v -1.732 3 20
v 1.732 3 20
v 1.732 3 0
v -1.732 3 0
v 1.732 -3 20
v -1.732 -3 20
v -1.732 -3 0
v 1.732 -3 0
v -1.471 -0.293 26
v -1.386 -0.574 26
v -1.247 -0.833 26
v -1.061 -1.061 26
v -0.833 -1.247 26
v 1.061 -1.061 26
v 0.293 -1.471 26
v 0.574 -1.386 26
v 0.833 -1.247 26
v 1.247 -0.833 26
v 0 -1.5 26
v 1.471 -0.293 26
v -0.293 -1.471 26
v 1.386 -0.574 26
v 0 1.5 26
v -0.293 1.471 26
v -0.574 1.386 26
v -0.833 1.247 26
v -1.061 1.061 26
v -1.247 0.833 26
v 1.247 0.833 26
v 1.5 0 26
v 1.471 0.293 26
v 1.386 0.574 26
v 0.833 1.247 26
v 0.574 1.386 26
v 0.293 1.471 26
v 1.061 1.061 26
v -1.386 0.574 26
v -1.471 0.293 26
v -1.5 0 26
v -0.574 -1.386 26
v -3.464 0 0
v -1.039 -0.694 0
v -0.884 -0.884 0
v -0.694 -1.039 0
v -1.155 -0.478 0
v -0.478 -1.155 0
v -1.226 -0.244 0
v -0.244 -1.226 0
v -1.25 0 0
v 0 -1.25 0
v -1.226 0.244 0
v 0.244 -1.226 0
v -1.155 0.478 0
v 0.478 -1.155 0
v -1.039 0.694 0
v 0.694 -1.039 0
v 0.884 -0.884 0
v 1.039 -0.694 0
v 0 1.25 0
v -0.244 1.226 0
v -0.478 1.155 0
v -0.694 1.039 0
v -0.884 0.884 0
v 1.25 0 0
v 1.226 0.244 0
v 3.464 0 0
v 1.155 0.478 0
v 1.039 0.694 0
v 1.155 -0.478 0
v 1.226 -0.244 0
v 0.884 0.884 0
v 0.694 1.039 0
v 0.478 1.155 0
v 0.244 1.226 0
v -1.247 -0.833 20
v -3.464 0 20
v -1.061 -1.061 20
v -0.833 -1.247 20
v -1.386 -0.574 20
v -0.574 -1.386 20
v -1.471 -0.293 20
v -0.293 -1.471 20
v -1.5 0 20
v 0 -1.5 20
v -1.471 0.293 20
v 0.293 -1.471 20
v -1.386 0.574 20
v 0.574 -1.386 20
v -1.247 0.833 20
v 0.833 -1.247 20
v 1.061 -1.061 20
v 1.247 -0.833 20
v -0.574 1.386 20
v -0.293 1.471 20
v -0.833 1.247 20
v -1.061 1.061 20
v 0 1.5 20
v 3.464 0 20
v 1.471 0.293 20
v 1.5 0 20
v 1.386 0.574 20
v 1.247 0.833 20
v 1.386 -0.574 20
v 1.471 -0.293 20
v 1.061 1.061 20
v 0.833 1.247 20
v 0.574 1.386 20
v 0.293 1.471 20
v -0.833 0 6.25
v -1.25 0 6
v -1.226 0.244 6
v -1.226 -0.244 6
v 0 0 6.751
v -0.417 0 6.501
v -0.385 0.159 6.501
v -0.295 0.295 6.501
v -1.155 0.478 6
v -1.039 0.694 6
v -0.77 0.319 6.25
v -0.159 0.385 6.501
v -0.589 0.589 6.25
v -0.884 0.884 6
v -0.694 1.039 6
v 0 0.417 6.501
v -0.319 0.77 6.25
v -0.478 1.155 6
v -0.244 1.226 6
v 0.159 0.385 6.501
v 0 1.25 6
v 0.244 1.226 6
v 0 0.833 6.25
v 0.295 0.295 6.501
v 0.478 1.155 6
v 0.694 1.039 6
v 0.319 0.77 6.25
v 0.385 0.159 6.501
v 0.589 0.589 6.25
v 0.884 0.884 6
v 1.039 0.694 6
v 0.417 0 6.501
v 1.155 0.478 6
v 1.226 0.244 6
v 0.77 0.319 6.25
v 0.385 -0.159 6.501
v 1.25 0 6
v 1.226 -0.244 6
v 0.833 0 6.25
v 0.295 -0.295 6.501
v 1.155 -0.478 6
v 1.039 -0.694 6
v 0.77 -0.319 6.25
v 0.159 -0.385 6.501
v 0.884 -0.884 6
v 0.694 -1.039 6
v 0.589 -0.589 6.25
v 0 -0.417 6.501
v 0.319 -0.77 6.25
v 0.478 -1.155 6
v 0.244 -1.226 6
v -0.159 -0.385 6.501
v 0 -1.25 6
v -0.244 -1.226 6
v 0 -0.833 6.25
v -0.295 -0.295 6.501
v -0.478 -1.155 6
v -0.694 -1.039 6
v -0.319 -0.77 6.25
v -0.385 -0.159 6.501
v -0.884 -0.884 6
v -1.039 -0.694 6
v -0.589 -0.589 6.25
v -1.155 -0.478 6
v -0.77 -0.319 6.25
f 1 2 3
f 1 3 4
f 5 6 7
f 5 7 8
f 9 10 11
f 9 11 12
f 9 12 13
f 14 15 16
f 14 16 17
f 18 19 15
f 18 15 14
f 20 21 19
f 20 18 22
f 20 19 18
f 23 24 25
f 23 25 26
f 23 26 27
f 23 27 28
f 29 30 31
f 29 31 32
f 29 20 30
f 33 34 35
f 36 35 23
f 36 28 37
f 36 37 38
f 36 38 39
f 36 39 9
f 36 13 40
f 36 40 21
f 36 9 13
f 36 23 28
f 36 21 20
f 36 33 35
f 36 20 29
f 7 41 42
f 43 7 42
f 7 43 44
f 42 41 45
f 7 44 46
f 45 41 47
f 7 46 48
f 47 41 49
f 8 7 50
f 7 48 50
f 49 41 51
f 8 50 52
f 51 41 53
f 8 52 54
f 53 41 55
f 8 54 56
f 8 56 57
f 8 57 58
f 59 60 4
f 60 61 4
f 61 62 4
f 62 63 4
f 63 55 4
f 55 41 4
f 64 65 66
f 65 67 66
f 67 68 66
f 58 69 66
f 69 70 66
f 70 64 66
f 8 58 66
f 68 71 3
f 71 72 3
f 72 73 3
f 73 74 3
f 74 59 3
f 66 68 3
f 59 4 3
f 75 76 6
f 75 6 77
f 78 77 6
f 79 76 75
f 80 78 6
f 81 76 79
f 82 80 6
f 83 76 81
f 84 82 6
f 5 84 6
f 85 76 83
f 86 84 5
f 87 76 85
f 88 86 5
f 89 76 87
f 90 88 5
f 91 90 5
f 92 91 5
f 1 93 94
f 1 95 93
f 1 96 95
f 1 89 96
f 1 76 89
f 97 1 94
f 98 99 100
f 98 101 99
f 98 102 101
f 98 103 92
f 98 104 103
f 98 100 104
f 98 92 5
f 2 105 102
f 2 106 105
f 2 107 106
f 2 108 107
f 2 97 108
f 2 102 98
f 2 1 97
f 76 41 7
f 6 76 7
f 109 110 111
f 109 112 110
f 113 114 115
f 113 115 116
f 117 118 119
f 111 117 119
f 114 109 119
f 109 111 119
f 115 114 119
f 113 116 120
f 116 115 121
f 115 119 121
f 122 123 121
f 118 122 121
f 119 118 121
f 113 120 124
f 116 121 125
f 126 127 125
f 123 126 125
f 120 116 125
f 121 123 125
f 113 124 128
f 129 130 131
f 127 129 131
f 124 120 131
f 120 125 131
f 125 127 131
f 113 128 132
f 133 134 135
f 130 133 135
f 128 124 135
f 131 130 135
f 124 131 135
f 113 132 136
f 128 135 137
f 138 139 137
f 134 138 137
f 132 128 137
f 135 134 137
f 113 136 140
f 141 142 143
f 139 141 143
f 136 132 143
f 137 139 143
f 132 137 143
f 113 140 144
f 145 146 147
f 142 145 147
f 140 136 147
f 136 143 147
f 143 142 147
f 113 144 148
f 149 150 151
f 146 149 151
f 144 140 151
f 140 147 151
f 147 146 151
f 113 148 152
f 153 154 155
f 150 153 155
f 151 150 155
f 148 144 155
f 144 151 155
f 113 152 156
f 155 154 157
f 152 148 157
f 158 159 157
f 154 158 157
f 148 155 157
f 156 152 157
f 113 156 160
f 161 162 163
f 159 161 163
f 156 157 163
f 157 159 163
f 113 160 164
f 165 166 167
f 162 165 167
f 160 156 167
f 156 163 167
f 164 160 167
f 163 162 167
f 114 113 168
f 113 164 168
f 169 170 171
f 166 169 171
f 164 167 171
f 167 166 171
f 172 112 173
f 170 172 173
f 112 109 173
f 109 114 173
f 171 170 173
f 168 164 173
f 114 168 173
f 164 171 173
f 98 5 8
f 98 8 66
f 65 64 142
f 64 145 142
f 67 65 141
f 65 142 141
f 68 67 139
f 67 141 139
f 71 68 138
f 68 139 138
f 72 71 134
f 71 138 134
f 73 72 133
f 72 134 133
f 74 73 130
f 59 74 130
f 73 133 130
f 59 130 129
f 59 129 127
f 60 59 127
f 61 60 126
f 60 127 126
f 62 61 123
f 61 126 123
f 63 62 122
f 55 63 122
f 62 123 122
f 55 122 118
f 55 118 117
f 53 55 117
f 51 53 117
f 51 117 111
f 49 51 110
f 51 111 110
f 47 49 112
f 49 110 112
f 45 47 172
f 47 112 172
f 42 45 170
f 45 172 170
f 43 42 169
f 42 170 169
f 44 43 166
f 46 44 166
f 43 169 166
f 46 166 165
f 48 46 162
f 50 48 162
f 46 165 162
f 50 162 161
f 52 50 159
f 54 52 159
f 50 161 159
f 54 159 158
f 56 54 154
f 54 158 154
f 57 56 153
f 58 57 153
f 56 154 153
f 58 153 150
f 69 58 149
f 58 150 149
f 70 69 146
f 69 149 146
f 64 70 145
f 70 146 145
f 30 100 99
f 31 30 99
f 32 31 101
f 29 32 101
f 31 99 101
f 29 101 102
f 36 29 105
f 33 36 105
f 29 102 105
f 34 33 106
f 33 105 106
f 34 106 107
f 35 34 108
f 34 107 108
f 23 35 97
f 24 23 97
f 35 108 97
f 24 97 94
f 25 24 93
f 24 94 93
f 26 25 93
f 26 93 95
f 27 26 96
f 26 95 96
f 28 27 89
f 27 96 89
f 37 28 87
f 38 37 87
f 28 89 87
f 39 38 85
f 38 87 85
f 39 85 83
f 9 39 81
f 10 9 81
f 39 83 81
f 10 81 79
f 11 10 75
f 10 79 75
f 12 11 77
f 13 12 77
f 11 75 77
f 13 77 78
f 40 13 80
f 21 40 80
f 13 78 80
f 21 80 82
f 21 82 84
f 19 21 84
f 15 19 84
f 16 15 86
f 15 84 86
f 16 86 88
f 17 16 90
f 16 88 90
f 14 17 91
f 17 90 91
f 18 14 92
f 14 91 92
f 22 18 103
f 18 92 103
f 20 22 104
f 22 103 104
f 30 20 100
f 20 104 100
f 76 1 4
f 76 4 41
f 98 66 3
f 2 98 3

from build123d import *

# Parameters (mm, degrees)
BOSS_EXTRUDE1_DEPTH       = 20
SKETCH2_R                 = 1.5
BOSS_EXTRUDE2_DEPTH       = 6
M3X0_5_TAPPED_HOLE1_D     = 2.5
M3X0_5_TAPPED_HOLE1_DEPTH = 6
M3X0_5_TAPPED_HOLE1_TIP   = 0.751075774


with BuildPart() as part:
    # Sketch1 → Boss-Extrude1 (new body)
    with BuildSketch(Plane.XY):
        Polygon((-3.464101615, 0), (-1.732050808, -3), (1.732050808, -3), (3.464101615, 0), (1.732050808, 3), (-1.732050808, 3), align=None)
    extrude(amount=BOSS_EXTRUDE1_DEPTH)

    # Sketch2 → Boss-Extrude2 (add)
    with BuildSketch(Plane.XY.offset(20)):
        Circle(SKETCH2_R)
    extrude(amount=BOSS_EXTRUDE2_DEPTH)

    # M3x0.5 Tapped Hole1
    with Locations(Plane(origin=(0, 0, 0), x_dir=(-1, 0, 0), z_dir=(0, 0, -1))):
        with Locations((0, 0)):
            Hole(M3X0_5_TAPPED_HOLE1_D / 2, depth=M3X0_5_TAPPED_HOLE1_DEPTH)
            with Locations((0, 0, -(M3X0_5_TAPPED_HOLE1_DEPTH + M3X0_5_TAPPED_HOLE1_TIP / 2))):  # 118° drill point
                Cone(0, M3X0_5_TAPPED_HOLE1_D / 2, M3X0_5_TAPPED_HOLE1_TIP, mode=Mode.SUBTRACT)


solid = part.part
